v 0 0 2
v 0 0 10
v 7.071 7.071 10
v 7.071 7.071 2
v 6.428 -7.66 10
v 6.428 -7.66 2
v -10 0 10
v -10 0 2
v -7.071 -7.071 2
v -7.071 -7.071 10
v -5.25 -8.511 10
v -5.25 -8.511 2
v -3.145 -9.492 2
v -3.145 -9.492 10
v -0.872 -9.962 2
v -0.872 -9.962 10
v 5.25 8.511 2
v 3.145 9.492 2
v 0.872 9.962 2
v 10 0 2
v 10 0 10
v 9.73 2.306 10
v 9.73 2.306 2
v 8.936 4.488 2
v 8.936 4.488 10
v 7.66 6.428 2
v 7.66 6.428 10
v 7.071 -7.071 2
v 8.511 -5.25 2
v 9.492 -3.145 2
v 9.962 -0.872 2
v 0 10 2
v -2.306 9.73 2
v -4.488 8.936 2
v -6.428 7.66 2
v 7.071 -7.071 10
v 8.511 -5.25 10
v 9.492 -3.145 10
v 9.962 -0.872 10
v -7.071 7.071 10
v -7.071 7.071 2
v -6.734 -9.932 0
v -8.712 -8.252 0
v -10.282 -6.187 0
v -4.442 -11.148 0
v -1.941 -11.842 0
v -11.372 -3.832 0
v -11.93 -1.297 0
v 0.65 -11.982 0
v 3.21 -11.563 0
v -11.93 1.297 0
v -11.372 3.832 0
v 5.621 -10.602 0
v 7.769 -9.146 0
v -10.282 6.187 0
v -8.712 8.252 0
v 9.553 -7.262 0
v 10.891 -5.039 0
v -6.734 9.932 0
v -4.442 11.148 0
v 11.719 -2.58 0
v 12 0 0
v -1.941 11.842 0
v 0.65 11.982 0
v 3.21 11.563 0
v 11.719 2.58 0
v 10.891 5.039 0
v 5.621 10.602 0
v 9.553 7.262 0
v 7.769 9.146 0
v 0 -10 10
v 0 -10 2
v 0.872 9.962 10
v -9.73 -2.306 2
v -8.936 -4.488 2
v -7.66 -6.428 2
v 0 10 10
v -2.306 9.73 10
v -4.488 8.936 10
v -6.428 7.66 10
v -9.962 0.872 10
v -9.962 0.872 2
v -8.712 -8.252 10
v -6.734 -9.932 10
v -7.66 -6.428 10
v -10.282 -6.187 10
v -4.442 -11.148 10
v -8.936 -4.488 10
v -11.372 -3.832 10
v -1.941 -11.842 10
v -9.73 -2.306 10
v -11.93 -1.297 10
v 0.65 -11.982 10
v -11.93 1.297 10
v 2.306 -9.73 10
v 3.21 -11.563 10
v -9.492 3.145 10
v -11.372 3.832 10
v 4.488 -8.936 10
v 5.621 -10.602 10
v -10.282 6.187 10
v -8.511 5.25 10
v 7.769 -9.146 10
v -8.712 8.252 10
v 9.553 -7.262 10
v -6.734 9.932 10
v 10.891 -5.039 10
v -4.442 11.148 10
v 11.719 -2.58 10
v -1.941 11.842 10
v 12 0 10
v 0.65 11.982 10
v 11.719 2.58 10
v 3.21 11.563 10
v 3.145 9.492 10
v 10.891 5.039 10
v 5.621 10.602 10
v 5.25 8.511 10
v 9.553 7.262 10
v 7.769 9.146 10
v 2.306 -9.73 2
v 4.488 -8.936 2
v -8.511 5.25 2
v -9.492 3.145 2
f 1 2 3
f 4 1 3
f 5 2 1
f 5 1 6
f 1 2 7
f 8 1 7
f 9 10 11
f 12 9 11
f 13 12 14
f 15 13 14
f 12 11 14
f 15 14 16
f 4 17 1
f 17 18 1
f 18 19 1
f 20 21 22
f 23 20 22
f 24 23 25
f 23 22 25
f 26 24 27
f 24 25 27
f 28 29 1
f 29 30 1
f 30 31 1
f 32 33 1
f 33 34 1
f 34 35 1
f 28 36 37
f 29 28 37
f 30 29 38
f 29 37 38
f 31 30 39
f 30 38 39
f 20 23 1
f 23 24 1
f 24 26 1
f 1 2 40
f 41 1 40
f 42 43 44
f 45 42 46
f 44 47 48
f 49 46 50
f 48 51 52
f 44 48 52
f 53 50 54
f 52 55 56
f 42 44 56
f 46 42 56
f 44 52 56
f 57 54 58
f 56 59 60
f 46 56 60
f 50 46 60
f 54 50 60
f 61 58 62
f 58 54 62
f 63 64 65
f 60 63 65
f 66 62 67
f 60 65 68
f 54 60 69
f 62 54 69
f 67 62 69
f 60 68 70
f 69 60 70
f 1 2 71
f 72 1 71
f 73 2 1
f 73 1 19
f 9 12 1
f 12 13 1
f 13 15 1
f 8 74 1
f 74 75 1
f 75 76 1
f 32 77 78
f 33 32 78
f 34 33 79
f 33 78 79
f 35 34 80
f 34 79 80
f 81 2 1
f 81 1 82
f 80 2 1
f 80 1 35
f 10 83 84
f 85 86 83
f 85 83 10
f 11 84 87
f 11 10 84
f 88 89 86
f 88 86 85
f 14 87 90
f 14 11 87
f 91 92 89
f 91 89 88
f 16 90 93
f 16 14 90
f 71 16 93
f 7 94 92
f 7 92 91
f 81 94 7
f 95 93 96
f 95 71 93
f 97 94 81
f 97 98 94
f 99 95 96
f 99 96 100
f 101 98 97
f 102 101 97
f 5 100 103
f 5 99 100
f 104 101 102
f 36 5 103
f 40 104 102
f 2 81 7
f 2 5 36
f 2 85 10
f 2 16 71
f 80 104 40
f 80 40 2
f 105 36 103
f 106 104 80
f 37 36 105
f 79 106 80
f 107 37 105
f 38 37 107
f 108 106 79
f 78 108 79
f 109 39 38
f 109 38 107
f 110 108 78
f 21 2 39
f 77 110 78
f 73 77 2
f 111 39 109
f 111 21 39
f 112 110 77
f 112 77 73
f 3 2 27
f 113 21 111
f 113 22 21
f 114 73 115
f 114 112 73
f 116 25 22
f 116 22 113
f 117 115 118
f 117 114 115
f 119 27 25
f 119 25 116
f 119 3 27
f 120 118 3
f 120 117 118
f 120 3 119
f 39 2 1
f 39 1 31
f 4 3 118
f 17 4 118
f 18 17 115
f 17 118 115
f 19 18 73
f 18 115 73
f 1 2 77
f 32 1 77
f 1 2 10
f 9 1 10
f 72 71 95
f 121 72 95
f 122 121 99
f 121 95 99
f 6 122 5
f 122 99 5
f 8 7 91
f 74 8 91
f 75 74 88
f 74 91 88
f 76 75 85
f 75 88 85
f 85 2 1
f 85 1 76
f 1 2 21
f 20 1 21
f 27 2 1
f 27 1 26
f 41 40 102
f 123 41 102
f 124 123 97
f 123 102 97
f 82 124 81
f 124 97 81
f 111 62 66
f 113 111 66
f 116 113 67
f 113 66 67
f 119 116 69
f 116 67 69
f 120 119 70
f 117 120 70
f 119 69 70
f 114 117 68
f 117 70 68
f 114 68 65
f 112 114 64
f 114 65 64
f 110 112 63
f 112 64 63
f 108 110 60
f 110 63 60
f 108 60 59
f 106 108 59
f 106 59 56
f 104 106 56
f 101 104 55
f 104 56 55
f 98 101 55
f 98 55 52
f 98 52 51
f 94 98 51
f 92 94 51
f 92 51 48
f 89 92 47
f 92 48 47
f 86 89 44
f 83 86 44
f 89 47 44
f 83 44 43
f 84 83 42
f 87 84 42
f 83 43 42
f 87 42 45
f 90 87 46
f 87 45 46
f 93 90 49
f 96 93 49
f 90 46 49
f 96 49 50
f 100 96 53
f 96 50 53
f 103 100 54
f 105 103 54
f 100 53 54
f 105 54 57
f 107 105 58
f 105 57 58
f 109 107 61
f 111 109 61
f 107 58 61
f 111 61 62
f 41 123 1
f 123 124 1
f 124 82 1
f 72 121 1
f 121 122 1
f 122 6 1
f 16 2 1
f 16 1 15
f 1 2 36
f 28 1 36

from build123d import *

# Parameters (mm, degrees)
CYLINDER001_W     = 10
CYLINDER001_H     = 12
CYLINDER001_ANGLE = 40
ARRAY_COUNT       = 8
CYLINDER_R        = 12
CYLINDER_DEPTH    = 10


with BuildPart() as array:
    # Cylinder001 → Cylinder001 (revolve)
    with BuildSketch(Plane(origin=(0, 0, 2), x_dir=(1, 0, 0), z_dir=(0, -1, 0))):
        with Locations((5, 6)):
            Rectangle(CYLINDER001_W, CYLINDER001_H)
    revolve(axis=Axis((0, 0, 2), (0, 0, 1)), revolution_arc=CYLINDER001_ANGLE)

    # Array: Array ×8 about axis
    array_axis = Axis((0, 0, 0), (0, 0, 1))


with BuildPart() as array_1:
    add(array.part)
    for i in range(1, ARRAY_COUNT):
        add(array.part.rotate(array_axis, i * 360 / ARRAY_COUNT))


with BuildPart() as cut:
    # Cylinder → Cylinder (new body)
    with BuildSketch(Plane.XY):
        Circle(CYLINDER_R)
    extrude(amount=CYLINDER_DEPTH)

    # Cut: cut Array
    add(array_1.part, mode=Mode.SUBTRACT)


solid = cut.part
